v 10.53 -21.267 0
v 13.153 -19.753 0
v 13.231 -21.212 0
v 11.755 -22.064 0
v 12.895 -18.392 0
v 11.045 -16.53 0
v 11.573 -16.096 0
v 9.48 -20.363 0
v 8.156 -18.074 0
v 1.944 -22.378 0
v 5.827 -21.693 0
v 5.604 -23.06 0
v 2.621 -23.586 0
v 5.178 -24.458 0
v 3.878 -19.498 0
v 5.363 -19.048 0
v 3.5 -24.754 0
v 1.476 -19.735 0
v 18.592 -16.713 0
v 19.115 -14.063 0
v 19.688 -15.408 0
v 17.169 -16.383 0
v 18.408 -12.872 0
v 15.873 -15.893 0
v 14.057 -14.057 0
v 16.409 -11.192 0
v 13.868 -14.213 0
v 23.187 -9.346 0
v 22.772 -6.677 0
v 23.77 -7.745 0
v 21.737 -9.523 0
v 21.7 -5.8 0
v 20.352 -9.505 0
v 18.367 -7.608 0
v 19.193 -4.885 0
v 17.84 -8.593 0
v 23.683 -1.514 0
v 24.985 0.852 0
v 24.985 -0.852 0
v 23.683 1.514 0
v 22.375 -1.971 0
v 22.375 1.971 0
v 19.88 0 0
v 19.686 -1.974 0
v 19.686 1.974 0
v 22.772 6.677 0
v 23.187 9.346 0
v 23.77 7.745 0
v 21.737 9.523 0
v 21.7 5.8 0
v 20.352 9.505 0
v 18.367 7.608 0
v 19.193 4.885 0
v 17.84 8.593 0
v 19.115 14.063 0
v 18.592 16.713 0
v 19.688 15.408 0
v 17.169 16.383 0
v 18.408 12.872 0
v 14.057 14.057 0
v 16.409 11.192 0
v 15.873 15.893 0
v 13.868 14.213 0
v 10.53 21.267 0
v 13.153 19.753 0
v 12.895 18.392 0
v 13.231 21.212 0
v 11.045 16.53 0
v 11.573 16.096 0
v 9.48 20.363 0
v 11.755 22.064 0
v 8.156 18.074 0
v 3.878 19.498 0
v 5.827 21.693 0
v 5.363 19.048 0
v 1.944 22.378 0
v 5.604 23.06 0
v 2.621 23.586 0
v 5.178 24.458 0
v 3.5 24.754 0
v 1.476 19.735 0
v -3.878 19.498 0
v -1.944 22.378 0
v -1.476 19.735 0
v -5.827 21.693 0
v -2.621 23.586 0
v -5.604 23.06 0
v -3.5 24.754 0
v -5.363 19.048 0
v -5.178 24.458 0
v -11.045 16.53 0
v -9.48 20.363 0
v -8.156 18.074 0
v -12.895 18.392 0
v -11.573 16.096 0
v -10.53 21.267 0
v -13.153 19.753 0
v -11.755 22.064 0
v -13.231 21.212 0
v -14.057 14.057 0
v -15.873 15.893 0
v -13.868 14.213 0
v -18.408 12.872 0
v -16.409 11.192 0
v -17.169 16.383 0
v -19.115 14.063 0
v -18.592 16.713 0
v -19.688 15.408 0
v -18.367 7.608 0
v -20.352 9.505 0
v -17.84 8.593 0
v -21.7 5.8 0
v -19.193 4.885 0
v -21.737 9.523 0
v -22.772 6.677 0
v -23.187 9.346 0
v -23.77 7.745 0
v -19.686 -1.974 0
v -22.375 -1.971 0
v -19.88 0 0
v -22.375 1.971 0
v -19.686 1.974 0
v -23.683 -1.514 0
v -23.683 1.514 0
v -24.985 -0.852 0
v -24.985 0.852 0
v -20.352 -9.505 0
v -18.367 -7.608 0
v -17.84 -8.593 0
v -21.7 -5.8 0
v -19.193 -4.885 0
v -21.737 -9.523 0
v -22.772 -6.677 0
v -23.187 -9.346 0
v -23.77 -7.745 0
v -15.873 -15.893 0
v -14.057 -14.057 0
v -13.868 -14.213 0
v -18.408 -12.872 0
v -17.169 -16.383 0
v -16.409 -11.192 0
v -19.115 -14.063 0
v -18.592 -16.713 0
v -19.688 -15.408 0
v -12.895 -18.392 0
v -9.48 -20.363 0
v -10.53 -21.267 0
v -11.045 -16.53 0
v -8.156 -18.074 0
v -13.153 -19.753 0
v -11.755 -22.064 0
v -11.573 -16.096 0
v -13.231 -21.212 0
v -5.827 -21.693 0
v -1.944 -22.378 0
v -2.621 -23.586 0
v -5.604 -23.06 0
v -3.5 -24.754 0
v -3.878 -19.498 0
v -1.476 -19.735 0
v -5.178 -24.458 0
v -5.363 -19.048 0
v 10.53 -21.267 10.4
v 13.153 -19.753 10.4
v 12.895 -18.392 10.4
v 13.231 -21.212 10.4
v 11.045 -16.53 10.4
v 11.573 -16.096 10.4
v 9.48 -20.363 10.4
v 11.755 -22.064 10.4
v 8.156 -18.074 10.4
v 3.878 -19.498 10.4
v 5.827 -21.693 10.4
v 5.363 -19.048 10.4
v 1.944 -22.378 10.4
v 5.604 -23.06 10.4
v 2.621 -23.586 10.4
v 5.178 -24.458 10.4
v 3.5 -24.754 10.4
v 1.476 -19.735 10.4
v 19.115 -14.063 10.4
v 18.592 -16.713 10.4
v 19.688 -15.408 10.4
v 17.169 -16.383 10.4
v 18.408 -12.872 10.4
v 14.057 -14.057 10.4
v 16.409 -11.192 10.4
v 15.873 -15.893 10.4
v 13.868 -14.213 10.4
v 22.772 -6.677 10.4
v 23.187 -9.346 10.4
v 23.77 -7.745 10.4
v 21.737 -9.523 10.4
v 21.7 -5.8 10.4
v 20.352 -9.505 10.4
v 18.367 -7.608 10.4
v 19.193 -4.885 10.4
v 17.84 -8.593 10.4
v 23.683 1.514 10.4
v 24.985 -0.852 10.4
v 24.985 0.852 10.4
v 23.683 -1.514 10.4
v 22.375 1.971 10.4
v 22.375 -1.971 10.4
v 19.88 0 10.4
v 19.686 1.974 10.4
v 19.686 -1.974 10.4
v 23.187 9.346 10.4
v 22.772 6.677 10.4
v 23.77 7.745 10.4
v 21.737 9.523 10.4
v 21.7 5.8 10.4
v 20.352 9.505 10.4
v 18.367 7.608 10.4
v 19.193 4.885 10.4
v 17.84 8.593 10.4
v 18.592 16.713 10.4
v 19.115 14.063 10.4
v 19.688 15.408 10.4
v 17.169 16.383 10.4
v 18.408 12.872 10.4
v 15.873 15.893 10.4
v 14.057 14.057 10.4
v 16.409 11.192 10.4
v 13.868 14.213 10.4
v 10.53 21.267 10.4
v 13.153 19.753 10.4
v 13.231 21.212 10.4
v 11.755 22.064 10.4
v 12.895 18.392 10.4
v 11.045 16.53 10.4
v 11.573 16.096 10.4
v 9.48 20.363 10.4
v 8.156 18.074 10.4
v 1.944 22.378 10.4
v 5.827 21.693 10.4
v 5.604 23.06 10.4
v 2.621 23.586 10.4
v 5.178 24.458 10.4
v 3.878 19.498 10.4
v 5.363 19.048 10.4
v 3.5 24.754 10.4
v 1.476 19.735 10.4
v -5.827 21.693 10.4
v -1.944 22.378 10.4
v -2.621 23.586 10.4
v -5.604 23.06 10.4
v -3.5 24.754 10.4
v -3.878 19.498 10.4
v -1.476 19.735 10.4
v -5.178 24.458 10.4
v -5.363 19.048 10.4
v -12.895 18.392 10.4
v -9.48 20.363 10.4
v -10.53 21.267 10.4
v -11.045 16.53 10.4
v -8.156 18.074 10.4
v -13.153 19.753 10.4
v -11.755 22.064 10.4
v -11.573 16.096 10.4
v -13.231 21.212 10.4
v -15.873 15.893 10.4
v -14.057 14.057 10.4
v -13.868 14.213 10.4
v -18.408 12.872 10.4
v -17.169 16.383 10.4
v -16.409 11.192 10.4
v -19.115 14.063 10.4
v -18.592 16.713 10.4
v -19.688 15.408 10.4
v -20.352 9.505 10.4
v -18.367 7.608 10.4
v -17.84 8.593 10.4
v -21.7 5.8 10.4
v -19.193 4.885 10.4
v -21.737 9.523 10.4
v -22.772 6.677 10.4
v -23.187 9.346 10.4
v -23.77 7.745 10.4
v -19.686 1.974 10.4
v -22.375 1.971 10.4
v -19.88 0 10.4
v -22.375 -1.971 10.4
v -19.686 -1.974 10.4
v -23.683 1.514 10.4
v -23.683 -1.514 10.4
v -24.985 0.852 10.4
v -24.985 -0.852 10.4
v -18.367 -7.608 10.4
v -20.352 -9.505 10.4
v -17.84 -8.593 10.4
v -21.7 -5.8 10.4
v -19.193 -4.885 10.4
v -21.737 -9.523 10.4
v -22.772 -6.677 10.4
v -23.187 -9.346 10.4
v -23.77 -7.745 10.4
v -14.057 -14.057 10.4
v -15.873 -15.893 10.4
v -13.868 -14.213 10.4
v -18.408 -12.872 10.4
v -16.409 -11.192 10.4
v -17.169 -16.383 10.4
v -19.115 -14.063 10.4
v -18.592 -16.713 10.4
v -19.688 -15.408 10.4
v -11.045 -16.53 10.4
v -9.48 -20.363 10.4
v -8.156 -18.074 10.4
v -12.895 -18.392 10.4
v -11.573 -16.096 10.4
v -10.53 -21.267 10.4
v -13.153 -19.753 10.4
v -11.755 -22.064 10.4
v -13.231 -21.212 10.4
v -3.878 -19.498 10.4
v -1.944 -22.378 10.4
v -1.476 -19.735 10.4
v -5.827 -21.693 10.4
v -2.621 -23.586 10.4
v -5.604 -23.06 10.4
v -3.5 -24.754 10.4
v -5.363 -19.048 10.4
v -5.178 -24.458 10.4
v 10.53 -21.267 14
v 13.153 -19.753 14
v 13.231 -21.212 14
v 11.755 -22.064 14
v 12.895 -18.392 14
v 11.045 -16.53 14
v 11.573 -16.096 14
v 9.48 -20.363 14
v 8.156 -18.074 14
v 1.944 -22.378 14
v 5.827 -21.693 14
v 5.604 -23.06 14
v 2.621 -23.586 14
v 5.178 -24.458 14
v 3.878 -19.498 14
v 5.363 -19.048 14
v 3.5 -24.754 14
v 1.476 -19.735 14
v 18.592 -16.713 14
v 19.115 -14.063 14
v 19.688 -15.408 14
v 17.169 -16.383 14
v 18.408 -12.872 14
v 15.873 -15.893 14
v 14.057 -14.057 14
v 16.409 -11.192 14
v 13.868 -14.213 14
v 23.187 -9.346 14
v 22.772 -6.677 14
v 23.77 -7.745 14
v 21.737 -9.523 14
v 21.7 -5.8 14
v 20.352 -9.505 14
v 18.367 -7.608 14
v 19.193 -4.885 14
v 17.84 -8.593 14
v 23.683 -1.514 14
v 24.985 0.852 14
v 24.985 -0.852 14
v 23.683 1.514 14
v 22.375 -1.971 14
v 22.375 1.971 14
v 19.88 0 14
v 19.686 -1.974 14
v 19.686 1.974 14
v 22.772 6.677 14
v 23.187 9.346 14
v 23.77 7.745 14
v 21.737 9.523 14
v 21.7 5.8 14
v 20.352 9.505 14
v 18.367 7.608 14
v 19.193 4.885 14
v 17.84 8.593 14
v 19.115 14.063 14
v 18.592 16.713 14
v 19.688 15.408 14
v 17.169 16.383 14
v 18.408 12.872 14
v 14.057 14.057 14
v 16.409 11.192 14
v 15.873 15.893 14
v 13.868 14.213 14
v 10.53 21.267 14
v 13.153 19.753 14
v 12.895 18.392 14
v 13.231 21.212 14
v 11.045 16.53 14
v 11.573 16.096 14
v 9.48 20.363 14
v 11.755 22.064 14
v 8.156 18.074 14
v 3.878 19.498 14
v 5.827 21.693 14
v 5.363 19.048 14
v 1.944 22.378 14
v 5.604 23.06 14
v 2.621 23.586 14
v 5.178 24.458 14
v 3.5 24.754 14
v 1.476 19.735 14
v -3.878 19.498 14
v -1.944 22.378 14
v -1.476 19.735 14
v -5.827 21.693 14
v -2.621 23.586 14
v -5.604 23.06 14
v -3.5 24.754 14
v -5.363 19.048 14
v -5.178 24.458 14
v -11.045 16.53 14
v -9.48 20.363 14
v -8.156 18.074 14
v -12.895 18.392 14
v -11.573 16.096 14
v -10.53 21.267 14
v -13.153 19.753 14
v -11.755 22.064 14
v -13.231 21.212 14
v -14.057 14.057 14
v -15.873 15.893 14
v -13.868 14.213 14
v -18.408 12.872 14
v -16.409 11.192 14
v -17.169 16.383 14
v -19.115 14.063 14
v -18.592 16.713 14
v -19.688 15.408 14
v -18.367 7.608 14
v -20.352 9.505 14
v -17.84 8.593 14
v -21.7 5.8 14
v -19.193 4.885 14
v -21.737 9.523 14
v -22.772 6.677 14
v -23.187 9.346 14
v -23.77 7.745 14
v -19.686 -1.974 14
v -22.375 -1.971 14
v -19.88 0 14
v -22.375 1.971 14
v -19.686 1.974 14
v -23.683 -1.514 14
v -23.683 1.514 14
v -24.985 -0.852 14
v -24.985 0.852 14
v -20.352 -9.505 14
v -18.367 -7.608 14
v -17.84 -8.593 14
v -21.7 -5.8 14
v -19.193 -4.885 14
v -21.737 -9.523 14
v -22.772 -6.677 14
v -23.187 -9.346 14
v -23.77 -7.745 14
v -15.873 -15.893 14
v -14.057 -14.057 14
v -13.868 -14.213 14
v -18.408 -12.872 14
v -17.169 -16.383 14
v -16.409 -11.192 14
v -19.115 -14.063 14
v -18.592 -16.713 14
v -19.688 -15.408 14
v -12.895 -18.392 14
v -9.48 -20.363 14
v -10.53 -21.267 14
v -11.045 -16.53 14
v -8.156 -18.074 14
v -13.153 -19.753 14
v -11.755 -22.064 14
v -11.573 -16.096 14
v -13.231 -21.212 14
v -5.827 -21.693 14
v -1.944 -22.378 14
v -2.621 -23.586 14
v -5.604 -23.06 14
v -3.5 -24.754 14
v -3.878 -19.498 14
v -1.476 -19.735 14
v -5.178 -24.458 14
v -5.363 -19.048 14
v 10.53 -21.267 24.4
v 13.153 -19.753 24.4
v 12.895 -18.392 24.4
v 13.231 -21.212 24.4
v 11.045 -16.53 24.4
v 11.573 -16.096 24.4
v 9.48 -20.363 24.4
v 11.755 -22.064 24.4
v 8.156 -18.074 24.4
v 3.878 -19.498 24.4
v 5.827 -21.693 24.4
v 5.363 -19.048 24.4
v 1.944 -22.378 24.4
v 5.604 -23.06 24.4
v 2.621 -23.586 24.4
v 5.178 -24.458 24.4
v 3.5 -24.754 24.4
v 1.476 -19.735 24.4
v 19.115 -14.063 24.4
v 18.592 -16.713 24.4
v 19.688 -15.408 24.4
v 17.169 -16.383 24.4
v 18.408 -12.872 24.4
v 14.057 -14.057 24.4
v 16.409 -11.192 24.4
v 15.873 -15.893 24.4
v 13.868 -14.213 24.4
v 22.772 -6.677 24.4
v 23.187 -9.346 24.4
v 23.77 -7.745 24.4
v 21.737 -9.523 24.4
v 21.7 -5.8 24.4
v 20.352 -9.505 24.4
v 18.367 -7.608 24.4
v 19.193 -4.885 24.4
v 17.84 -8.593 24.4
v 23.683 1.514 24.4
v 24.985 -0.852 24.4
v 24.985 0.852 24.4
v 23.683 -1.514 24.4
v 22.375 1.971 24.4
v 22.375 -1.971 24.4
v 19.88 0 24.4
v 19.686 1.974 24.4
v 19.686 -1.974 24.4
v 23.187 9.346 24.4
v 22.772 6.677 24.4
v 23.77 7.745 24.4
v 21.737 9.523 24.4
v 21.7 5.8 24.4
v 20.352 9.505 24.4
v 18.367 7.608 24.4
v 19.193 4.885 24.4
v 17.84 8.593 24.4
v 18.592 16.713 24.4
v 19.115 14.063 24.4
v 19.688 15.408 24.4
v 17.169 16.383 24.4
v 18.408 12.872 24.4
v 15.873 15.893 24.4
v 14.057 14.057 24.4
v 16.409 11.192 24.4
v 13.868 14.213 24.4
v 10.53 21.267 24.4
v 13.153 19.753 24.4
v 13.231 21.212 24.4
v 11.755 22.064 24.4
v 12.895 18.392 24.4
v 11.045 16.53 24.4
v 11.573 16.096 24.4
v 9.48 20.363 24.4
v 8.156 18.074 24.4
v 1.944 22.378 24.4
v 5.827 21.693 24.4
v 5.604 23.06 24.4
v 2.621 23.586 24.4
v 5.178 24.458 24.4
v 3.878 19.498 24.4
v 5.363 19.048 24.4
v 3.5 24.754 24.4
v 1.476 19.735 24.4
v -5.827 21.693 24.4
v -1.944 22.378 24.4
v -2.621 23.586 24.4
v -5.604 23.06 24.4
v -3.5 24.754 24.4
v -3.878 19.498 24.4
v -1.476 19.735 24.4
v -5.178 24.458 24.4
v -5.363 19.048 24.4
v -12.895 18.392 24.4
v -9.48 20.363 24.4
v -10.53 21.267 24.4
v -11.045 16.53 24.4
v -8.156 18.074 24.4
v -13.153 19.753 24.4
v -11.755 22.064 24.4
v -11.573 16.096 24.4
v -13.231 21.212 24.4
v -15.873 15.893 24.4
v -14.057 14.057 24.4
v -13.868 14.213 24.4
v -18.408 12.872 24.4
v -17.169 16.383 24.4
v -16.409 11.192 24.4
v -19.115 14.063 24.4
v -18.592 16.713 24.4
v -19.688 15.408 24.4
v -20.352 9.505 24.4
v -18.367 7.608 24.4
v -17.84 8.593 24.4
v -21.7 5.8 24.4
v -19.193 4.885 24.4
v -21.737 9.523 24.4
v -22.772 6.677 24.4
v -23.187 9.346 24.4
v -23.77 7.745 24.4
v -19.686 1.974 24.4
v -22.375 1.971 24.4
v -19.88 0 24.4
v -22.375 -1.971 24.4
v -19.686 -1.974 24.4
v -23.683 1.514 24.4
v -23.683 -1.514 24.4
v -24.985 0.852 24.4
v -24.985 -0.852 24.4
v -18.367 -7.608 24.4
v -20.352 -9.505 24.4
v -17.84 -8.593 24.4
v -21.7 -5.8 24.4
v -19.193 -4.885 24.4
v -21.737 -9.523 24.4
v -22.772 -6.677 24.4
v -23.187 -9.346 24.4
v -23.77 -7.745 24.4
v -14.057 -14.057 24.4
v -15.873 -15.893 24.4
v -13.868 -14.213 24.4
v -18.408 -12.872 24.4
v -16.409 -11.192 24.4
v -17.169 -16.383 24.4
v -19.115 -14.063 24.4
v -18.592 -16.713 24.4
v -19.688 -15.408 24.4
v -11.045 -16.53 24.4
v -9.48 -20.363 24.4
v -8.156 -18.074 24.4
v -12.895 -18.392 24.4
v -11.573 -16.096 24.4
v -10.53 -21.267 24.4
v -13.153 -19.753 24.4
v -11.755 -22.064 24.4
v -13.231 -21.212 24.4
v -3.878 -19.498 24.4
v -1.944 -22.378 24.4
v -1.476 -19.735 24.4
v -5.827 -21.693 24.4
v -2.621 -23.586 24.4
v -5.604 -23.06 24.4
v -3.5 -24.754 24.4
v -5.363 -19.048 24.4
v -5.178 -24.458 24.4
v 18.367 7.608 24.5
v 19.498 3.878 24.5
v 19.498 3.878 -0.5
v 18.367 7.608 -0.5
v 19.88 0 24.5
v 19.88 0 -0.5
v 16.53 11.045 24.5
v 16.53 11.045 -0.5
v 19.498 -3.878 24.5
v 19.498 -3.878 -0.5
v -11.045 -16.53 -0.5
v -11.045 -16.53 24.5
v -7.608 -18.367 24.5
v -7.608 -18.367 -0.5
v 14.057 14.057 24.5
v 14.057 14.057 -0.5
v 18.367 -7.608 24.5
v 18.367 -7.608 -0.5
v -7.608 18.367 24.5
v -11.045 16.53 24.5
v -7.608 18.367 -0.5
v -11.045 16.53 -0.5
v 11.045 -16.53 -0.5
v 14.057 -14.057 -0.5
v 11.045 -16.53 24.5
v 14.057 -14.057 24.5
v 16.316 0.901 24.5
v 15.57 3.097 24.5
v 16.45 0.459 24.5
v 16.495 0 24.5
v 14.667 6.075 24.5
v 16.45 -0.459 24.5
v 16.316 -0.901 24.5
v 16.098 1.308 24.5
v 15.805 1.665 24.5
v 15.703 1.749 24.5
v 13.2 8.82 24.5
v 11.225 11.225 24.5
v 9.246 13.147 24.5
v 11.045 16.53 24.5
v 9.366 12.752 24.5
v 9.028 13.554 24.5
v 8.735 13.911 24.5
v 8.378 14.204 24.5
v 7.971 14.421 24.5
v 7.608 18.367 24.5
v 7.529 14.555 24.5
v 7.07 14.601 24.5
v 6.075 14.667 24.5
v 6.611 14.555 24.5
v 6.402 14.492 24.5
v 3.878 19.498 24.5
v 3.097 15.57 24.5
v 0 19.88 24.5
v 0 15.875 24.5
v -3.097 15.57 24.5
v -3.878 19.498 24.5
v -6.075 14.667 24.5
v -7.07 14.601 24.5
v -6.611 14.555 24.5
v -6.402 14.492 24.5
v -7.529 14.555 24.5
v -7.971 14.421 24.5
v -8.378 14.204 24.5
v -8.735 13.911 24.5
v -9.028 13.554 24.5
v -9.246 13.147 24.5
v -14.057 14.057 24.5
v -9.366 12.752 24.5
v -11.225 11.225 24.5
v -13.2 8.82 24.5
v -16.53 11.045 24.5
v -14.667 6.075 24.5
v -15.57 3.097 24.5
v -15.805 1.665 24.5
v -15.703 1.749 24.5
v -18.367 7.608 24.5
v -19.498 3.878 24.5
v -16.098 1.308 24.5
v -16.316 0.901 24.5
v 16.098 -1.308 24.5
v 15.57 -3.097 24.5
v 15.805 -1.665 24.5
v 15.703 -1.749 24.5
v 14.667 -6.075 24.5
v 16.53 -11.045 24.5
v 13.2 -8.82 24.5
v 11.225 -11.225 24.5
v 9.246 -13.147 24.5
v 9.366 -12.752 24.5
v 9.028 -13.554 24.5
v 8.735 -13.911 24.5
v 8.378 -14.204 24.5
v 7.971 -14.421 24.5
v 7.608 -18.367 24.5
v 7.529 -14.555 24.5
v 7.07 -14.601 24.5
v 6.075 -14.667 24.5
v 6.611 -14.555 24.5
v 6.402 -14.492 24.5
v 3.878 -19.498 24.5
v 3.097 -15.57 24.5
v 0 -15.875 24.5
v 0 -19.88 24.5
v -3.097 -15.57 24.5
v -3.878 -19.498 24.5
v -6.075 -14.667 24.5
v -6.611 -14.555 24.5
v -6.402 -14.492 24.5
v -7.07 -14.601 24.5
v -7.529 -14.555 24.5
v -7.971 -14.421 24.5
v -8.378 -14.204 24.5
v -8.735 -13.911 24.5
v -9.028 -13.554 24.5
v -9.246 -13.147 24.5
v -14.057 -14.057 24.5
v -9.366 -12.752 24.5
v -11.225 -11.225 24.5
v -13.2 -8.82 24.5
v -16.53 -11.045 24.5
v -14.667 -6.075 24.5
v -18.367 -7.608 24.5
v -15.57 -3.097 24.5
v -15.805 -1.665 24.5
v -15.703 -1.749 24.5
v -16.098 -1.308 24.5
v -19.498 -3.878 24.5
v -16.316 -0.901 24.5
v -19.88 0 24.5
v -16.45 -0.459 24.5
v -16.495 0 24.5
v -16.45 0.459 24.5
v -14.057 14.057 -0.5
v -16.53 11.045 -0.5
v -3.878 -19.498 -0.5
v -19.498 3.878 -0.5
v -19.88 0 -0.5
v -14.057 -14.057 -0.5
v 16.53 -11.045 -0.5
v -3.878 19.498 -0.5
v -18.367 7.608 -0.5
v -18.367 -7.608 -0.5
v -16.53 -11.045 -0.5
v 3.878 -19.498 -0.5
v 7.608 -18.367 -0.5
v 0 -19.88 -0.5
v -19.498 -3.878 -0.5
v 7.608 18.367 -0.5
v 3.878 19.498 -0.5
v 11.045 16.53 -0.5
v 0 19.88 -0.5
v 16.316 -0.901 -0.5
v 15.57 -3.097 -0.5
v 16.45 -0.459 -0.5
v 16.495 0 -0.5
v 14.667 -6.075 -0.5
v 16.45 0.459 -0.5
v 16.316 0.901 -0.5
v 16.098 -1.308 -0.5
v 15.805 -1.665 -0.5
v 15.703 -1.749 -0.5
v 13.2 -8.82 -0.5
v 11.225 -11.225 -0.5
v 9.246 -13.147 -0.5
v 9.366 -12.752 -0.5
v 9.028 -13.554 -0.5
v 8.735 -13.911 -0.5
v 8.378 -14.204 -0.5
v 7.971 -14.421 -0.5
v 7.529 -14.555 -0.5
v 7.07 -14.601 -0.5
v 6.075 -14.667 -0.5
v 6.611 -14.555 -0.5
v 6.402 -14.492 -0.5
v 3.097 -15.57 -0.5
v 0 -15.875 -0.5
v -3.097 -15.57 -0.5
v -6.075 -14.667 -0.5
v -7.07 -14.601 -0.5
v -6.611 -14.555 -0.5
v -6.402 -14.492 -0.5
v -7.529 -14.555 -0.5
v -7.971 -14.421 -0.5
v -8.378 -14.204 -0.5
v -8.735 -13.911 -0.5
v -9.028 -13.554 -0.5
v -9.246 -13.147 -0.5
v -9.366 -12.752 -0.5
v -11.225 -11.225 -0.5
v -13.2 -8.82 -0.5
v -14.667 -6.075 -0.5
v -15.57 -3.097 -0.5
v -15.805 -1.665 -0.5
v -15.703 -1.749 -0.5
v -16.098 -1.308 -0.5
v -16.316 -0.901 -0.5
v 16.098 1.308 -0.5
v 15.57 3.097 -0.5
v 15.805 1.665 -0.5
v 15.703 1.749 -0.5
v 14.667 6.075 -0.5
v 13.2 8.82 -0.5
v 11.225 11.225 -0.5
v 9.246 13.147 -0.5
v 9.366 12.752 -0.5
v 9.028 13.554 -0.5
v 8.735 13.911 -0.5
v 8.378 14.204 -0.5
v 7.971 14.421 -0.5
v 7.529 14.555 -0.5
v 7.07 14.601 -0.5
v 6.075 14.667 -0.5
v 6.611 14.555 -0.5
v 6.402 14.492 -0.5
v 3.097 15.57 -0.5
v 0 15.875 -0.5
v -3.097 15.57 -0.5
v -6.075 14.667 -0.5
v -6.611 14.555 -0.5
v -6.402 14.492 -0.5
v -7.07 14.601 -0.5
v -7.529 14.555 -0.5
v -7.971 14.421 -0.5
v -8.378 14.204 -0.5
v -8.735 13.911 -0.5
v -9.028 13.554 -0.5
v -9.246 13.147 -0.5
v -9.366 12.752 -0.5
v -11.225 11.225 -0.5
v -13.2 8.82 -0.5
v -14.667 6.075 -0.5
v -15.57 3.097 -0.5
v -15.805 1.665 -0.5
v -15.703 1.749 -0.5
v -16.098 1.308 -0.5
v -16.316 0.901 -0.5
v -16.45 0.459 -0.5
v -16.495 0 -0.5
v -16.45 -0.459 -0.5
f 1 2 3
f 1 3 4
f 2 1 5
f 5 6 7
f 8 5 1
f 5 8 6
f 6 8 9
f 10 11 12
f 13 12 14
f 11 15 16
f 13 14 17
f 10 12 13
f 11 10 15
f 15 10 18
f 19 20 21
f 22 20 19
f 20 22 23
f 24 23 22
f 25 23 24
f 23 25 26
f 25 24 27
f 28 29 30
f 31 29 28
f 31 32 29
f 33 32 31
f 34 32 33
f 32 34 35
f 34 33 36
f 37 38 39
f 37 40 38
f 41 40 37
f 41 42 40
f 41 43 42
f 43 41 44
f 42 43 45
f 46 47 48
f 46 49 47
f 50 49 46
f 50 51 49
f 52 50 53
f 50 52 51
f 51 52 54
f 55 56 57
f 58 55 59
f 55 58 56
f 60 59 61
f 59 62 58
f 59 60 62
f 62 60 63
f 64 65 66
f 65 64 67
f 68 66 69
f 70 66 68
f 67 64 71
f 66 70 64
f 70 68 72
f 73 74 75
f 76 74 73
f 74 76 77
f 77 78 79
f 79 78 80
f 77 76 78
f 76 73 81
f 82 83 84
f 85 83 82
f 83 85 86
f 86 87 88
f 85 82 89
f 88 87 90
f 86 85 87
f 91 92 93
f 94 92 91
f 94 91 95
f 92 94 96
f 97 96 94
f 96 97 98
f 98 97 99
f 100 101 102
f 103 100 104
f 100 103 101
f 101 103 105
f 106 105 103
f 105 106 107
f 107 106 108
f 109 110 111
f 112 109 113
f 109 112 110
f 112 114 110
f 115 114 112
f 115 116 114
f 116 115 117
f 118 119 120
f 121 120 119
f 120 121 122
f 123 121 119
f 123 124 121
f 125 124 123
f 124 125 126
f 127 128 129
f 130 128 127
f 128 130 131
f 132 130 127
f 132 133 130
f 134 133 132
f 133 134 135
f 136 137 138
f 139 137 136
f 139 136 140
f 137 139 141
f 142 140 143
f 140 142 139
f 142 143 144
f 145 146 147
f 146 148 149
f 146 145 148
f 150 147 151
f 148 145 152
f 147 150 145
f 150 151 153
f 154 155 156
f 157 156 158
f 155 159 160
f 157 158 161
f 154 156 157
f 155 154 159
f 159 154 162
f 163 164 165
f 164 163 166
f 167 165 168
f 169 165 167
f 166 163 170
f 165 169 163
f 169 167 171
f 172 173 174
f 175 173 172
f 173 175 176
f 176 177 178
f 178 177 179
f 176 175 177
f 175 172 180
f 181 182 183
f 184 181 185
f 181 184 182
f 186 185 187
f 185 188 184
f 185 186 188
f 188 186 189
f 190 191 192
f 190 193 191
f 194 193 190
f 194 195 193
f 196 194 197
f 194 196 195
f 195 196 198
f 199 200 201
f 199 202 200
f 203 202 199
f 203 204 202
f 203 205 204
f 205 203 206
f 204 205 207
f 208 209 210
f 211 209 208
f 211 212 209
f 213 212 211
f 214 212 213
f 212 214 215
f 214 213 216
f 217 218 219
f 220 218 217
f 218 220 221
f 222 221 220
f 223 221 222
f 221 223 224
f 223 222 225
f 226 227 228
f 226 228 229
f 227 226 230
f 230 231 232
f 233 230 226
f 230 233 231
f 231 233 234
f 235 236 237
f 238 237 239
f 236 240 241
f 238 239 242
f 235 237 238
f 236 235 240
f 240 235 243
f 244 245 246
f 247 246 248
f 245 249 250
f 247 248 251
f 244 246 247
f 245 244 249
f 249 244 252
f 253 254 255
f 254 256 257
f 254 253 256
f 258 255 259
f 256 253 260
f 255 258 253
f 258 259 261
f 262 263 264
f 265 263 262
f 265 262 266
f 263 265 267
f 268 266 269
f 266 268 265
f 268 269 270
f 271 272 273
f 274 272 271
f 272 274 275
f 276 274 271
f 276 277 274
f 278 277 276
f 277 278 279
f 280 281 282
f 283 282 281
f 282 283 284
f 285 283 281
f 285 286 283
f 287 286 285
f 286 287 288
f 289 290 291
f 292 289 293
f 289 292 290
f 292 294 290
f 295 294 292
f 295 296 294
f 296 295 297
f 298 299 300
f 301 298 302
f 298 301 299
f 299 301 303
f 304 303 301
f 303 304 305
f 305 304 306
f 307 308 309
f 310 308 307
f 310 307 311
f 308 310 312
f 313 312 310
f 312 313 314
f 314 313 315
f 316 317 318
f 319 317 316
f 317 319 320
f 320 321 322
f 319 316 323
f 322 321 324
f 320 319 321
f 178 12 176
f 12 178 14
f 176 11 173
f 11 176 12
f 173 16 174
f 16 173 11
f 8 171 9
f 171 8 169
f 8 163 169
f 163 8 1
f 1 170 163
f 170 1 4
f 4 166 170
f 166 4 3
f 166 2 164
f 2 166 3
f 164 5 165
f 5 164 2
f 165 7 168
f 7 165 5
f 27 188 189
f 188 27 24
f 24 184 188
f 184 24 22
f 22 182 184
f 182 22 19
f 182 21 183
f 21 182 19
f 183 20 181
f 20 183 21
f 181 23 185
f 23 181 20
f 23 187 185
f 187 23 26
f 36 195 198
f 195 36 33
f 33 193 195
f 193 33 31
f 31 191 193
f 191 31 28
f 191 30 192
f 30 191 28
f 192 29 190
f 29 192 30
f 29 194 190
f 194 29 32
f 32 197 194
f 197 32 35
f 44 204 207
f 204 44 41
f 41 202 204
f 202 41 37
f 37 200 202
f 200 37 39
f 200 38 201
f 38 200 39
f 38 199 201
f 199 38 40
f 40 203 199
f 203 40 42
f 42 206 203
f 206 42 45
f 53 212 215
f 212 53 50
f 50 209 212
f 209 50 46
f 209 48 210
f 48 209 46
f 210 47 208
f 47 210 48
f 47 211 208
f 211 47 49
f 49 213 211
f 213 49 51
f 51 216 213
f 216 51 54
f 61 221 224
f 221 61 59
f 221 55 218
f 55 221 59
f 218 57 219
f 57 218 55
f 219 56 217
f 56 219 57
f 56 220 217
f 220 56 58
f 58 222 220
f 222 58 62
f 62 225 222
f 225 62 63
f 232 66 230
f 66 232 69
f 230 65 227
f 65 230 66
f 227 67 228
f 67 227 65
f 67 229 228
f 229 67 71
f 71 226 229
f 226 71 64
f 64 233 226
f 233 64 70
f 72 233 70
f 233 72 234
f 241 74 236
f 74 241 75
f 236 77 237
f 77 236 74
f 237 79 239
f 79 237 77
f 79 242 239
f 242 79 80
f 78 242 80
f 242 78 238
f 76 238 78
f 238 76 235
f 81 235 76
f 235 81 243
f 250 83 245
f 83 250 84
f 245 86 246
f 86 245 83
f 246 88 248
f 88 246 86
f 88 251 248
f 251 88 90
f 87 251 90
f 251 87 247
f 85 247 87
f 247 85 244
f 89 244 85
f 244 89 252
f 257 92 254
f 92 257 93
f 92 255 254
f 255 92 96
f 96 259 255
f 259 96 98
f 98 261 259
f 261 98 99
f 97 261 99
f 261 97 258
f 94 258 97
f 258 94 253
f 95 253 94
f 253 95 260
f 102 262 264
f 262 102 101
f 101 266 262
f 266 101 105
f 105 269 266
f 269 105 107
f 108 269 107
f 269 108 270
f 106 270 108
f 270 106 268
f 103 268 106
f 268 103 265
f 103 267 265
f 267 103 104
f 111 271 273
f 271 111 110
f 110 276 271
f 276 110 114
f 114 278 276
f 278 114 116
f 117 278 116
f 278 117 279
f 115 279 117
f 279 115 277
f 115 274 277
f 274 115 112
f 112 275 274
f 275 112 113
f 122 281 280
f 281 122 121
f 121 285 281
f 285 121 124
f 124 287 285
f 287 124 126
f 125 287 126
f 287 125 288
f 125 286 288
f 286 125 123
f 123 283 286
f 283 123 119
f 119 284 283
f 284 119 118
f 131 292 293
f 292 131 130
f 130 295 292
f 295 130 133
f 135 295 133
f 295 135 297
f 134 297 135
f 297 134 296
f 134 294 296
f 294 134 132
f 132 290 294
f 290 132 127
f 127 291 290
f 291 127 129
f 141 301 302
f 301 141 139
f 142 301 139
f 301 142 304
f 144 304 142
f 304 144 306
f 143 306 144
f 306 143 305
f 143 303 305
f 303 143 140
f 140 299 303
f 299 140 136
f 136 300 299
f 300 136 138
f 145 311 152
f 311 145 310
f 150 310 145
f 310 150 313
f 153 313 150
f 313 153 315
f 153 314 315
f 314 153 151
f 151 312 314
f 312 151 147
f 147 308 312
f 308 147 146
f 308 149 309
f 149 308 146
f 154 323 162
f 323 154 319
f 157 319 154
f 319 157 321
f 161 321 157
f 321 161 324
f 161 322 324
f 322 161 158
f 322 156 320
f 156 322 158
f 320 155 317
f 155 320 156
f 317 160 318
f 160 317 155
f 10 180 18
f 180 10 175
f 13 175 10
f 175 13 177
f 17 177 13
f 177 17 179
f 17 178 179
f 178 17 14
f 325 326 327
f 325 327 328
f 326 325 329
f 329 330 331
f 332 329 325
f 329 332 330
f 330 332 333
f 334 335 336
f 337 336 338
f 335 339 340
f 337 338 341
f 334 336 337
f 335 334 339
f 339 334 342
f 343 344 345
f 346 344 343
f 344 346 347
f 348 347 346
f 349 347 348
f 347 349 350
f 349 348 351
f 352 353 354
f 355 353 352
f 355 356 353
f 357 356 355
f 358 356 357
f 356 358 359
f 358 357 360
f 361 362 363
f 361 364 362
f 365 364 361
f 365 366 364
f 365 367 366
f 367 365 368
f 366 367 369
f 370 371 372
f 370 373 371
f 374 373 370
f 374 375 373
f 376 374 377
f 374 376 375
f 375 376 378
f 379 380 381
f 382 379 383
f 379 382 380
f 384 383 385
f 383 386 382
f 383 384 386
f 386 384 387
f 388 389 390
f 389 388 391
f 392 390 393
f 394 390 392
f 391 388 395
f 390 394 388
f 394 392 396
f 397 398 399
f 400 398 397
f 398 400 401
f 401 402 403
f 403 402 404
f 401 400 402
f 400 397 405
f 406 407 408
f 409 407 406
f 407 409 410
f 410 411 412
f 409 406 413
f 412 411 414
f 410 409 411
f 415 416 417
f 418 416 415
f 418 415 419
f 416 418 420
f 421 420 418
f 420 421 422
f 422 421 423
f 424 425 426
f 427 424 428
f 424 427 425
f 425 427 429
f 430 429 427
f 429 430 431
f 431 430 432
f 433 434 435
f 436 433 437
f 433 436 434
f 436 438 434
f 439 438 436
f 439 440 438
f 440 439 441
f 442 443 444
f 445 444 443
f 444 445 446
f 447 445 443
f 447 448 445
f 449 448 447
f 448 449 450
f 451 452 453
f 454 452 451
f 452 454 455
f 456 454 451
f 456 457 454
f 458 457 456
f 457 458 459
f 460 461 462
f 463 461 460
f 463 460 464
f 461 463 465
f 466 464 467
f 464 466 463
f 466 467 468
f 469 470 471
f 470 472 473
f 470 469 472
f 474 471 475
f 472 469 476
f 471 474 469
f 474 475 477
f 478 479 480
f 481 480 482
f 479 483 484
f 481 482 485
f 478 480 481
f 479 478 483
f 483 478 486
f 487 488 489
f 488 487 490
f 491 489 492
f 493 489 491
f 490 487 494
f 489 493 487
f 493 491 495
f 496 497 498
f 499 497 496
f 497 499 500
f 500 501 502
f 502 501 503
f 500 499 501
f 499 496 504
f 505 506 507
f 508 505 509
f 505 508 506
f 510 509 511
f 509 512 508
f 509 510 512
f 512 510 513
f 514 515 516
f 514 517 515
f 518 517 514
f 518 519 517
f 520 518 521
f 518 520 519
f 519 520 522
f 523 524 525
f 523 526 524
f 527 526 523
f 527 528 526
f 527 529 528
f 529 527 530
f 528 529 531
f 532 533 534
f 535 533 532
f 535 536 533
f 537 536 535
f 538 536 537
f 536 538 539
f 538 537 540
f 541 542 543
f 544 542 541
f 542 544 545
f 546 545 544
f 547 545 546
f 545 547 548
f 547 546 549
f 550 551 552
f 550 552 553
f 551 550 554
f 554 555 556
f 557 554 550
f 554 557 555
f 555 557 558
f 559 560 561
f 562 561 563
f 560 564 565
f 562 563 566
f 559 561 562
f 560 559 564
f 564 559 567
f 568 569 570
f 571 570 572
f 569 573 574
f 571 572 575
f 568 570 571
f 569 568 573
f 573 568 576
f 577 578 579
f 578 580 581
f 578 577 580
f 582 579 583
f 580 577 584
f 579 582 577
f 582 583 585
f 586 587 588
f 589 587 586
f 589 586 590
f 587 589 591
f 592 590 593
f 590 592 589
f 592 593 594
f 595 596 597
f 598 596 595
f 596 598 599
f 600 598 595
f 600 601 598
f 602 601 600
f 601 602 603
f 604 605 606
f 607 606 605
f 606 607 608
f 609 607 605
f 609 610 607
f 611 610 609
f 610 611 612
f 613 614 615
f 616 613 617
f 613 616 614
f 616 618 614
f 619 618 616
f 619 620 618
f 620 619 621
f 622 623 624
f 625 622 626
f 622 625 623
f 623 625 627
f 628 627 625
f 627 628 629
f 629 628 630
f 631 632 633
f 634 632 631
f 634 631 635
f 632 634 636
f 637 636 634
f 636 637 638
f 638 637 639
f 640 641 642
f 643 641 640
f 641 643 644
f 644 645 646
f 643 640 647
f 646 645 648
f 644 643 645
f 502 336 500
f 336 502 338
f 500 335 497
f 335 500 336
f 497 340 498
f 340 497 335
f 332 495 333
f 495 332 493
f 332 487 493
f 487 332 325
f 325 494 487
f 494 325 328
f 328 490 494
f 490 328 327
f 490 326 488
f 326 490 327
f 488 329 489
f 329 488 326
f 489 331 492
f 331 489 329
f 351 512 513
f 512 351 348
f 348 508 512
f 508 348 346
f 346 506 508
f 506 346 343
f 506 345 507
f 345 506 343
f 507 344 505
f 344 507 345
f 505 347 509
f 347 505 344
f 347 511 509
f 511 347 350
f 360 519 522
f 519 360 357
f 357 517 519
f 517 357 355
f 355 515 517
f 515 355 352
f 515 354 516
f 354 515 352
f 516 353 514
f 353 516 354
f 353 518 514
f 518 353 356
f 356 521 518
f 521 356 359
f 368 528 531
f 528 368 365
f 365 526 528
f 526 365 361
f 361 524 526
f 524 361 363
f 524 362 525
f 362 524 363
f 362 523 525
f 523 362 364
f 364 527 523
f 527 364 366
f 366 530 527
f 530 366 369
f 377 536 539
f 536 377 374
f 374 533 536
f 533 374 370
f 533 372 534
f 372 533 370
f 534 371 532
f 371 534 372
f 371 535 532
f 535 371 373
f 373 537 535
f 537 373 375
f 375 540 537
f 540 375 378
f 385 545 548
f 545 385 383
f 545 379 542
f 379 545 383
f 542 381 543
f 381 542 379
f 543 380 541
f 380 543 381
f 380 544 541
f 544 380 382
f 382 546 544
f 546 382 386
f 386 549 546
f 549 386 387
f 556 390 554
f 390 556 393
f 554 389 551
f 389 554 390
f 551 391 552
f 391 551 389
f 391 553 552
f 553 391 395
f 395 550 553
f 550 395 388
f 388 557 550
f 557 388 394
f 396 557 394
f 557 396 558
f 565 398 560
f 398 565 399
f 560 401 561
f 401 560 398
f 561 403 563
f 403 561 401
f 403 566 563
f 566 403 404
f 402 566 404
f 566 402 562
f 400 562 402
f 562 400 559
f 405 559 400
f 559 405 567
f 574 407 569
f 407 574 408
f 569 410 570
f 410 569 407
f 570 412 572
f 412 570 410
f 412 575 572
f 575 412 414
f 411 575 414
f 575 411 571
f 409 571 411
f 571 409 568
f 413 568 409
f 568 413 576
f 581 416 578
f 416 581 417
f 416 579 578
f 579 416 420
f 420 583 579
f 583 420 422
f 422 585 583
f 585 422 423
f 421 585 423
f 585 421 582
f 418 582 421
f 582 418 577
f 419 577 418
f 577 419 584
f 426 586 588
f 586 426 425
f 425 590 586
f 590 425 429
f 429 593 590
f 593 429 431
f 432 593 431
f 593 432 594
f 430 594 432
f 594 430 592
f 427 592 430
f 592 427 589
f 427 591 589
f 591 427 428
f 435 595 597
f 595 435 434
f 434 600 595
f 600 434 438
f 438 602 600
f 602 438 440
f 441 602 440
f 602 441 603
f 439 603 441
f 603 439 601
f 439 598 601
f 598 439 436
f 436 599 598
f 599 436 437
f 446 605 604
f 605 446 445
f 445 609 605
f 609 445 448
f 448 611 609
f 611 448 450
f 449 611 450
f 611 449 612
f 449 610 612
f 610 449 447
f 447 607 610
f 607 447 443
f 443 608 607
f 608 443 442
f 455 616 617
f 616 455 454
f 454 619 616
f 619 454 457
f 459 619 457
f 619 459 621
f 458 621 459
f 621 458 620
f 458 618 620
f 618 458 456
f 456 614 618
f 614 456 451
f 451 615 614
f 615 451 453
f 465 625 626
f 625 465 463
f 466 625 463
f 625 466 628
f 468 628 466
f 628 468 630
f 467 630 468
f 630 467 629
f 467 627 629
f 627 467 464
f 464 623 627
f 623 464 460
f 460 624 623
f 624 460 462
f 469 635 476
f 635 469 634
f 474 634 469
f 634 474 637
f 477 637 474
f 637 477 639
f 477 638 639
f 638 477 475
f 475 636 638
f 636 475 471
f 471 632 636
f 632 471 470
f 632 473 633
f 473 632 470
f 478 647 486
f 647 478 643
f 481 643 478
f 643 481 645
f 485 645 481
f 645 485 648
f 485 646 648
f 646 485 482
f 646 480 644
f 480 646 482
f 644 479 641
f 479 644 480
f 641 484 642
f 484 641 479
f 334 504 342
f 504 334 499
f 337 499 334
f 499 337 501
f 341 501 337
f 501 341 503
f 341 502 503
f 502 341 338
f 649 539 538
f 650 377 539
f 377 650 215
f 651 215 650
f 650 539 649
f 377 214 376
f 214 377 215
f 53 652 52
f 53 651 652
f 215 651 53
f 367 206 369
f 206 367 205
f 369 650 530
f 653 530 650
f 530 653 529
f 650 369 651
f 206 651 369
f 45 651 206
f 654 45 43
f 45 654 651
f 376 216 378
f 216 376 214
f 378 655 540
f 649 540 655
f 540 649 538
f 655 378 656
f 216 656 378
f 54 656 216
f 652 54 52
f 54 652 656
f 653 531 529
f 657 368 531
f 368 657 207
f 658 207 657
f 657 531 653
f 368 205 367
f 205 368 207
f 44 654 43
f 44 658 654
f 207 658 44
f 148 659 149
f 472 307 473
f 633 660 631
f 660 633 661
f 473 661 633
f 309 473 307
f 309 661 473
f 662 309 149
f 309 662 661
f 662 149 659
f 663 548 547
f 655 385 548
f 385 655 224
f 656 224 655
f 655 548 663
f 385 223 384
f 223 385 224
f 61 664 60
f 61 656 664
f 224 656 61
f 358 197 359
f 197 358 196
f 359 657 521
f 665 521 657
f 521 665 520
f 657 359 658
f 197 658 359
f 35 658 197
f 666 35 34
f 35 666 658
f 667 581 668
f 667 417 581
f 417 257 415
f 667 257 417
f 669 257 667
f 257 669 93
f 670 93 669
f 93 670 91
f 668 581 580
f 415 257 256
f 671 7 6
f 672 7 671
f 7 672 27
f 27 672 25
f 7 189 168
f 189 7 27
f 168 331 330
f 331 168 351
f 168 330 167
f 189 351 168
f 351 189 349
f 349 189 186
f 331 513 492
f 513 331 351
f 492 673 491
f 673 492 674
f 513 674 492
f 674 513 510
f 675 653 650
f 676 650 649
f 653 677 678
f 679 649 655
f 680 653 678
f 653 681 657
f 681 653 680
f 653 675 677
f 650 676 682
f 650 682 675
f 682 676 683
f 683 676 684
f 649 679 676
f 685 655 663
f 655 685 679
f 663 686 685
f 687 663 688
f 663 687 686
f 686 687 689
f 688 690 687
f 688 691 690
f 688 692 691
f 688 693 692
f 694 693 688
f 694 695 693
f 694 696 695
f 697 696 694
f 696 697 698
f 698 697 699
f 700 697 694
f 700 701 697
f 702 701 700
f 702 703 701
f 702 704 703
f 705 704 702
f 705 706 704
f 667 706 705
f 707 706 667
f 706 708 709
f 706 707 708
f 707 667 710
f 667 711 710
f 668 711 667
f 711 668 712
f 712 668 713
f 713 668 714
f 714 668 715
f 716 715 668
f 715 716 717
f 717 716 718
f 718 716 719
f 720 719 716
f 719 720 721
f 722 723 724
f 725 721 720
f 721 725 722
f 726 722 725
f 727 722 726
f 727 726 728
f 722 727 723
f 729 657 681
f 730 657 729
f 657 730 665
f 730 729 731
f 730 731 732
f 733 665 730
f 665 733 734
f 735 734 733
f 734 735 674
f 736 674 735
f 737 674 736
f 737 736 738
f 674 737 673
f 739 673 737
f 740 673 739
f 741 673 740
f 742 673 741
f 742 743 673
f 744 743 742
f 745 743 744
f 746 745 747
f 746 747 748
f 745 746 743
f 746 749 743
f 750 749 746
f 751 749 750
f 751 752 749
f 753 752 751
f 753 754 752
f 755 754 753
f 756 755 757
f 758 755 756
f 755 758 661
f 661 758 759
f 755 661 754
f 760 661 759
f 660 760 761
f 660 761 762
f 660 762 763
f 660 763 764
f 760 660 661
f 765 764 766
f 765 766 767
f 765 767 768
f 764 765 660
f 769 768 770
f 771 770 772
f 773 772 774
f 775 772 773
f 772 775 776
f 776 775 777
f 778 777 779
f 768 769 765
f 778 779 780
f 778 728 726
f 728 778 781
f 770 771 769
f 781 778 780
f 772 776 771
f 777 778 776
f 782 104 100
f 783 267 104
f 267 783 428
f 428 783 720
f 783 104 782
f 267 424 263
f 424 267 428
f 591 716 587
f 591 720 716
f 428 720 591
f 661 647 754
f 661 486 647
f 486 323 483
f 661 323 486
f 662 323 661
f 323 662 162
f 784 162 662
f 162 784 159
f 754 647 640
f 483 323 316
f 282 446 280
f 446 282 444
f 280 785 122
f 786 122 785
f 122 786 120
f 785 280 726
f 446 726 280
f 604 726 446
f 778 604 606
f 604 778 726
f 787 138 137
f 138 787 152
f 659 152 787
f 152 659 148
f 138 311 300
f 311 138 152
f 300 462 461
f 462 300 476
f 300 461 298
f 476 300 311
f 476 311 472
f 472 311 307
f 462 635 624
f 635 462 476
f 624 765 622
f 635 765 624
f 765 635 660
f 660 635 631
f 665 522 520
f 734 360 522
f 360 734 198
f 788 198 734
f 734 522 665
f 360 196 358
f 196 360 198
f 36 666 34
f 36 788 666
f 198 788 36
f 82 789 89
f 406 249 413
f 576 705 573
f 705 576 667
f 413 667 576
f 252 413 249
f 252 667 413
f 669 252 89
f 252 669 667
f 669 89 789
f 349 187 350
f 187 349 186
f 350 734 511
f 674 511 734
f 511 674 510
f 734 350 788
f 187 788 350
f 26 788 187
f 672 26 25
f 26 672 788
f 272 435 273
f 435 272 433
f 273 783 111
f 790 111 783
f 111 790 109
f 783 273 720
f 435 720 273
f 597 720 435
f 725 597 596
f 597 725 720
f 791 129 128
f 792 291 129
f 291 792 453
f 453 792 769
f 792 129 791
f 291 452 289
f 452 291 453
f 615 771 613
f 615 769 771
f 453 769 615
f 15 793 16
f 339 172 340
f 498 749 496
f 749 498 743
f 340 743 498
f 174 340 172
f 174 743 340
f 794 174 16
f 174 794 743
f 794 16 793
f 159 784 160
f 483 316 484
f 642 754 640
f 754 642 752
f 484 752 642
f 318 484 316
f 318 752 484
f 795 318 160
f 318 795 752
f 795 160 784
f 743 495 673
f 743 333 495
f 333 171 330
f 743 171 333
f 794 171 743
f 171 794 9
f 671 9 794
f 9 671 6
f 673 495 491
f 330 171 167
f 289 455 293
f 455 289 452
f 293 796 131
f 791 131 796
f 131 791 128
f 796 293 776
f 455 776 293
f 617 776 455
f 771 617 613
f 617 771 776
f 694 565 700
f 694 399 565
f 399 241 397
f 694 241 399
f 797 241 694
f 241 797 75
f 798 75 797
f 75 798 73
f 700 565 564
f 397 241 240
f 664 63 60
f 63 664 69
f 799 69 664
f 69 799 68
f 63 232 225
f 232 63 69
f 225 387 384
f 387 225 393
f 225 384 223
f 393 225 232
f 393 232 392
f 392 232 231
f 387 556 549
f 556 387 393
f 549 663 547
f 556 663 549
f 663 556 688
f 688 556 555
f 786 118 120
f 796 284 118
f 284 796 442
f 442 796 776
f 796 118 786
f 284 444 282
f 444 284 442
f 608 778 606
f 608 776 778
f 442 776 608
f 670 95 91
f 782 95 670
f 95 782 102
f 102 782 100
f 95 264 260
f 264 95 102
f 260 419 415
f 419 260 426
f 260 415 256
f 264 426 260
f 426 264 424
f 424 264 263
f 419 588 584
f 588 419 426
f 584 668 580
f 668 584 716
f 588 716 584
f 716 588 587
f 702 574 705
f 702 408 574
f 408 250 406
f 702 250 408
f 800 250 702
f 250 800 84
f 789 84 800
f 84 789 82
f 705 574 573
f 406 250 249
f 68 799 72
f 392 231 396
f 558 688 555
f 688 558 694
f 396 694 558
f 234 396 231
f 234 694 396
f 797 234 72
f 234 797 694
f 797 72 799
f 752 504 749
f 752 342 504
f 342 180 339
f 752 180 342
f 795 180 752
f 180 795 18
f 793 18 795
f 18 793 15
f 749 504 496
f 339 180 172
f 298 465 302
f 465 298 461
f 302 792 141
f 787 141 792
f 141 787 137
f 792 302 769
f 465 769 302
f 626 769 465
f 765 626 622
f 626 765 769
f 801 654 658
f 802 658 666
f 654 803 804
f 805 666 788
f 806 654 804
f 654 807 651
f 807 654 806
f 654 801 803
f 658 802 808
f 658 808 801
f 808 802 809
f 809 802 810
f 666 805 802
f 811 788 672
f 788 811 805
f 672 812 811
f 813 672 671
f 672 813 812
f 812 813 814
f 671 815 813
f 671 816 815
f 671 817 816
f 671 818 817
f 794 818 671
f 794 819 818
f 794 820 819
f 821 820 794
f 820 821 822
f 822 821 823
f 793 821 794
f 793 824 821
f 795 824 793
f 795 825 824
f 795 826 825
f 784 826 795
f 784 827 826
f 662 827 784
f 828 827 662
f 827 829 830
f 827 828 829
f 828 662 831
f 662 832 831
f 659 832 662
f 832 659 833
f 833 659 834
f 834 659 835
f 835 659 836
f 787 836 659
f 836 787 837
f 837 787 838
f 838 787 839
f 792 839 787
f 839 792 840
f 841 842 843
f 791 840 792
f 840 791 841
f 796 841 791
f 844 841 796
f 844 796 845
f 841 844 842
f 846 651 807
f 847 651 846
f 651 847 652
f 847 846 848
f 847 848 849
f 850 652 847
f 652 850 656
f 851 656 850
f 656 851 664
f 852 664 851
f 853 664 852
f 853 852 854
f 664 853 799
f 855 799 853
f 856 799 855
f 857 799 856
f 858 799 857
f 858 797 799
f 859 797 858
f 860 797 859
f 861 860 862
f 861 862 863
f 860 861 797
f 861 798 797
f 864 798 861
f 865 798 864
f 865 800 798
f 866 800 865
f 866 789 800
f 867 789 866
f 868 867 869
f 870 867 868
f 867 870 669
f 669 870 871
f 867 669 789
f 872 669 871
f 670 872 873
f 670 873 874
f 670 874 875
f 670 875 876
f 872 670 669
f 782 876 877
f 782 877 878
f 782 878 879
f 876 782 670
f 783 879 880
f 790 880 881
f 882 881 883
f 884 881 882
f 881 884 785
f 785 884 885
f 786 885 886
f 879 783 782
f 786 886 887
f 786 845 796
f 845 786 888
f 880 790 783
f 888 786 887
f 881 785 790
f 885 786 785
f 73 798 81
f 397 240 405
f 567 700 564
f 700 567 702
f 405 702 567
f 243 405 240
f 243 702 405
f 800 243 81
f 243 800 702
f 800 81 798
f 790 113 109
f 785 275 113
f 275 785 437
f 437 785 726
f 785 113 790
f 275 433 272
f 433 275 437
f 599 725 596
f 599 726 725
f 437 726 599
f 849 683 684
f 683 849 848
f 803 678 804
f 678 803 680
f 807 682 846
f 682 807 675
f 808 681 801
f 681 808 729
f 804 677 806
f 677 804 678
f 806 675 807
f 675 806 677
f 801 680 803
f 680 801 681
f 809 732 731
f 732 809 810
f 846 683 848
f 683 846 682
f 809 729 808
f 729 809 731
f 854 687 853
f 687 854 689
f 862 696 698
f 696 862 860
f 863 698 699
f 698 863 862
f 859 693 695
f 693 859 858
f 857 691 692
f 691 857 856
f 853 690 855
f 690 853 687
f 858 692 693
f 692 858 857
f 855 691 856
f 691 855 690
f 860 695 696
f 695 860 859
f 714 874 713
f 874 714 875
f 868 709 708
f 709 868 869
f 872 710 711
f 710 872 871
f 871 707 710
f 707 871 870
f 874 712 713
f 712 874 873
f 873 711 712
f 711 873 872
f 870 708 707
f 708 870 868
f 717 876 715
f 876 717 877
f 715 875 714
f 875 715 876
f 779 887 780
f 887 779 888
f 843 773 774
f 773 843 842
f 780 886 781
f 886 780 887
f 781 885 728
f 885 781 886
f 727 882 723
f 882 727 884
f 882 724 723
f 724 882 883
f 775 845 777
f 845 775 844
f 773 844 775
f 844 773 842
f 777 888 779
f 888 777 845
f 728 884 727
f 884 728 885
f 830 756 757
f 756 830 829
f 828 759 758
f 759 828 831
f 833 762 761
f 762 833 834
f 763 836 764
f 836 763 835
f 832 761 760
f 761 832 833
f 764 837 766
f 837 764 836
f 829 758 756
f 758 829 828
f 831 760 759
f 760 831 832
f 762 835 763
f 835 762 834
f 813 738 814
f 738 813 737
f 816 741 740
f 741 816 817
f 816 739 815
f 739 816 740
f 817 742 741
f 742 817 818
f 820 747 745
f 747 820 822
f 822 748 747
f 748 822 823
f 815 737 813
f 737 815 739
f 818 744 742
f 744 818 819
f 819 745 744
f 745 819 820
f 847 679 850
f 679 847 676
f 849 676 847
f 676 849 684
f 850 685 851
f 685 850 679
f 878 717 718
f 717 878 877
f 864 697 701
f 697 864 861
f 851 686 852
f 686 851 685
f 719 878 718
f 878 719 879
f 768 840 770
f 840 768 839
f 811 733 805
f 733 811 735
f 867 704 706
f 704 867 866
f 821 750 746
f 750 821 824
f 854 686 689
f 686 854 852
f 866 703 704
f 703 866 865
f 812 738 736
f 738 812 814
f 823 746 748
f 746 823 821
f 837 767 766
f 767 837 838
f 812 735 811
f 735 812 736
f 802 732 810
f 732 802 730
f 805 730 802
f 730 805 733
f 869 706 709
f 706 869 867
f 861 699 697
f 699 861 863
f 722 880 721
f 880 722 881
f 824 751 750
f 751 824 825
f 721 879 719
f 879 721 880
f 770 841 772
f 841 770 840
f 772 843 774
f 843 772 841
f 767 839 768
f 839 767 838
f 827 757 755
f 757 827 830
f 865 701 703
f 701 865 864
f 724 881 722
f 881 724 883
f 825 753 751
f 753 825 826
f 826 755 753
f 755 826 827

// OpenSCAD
$fn = 32;

// ----------------------------------------------------------------------
// Two-module gear rim: z18 m2.5 and z18 m2.5, 24 mm wide
// ----------------------------------------------------------------------

// --- parameters (mm) ---
module_a = 2.5;           // first tooth module
teeth_a = 18;             // first band tooth count
module_b = 2.5;           // second tooth module
teeth_b = 18;             // second band tooth count
band_h = 10;              // height of one tooth band
web_t = 4;                // web thickness between the bands
total = 24;               // overall width over both bands
root_r = 19.38;           // root radius of the coarse band
hub_r = 19.88;            // hub radius
bore_d = 31.75;           // hub bore
hole_count = 6;           // lightening holes
hole_r = 14.14;           // lightening hole circle radius
hole_d = 4.71;            // lightening hole diameter

band_a = [[19.274, -1.974], [22.375, -1.971], [23.683, -1.514], [24.985, -0.852], [24.985, 0.852], [23.683, 1.514], [22.375, 1.971], [19.274, 1.974], [18.787, 4.737], [21.7, 5.8], [22.772, 6.677], [23.77, 7.745], [23.187, 9.346], [21.737, 9.523], [20.352, 9.505], [17.437, 8.447], [16.034, 10.877], [18.408, 12.872], [19.115, 14.063], [19.688, 15.408], [18.592, 16.713], [17.169, 16.383], [15.873, 15.893], [13.496, 13.901], [11.347, 15.705], [12.895, 18.392], [13.153, 19.753], [13.231, 21.212], [11.755, 22.064], [10.53, 21.267], [9.48, 20.363], [7.928, 17.679], [5.291, 18.639], [5.827, 21.693], [5.604, 23.06], [5.178, 24.458], [3.5, 24.754], [2.621, 23.586], [1.944, 22.378], [1.403, 19.324], [-1.403, 19.324], [-1.944, 22.378], [-2.621, 23.586], [-3.5, 24.754], [-5.178, 24.458], [-5.604, 23.06], [-5.827, 21.693], [-5.291, 18.639], [-7.928, 17.679], [-9.48, 20.363], [-10.53, 21.267], [-11.755, 22.064], [-13.231, 21.212], [-13.153, 19.753], [-12.895, 18.392], [-11.347, 15.705], [-13.496, 13.901], [-15.873, 15.893], [-17.169, 16.383], [-18.592, 16.713], [-19.688, 15.408], [-19.115, 14.063], [-18.408, 12.872], [-16.034, 10.877], [-17.437, 8.447], [-20.352, 9.505], [-21.737, 9.523], [-23.187, 9.346], [-23.77, 7.745], [-22.772, 6.677], [-21.7, 5.8], [-18.787, 4.737], [-19.274, 1.974], [-22.375, 1.971], [-23.683, 1.514], [-24.985, 0.852], [-24.985, -0.852], [-23.683, -1.514], [-22.375, -1.971], [-19.274, -1.974], [-18.787, -4.737], [-21.7, -5.8], [-22.772, -6.677], [-23.77, -7.745], [-23.187, -9.346], [-21.737, -9.523], [-20.352, -9.505], [-17.437, -8.447], [-16.034, -10.877], [-18.408, -12.872], [-19.115, -14.063], [-19.688, -15.408], [-18.592, -16.713], [-17.169, -16.383], [-15.873, -15.893], [-13.496, -13.901], [-11.347, -15.705], [-12.895, -18.392], [-13.153, -19.753], [-13.231, -21.212], [-11.755, -22.064], [-10.53, -21.267], [-9.48, -20.363], [-7.928, -17.679], [-5.291, -18.639], [-5.827, -21.693], [-5.604, -23.06], [-5.178, -24.458], [-3.5, -24.754], [-2.621, -23.586], [-1.944, -22.378], [-1.403, -19.324], [1.403, -19.324], [1.944, -22.378], [2.621, -23.586], [3.5, -24.754], [5.178, -24.458], [5.604, -23.06], [5.827, -21.693], [5.291, -18.639], [7.928, -17.679], [9.48, -20.363], [10.53, -21.267], [11.755, -22.064], [13.231, -21.212], [13.153, -19.753], [12.895, -18.392], [11.347, -15.705], [13.496, -13.901], [15.873, -15.893], [17.169, -16.383], [18.592, -16.713], [19.688, -15.408], [19.115, -14.063], [18.408, -12.872], [16.034, -10.877], [17.437, -8.447], [20.352, -9.505], [21.737, -9.523], [23.187, -9.346], [23.77, -7.745], [22.772, -6.677], [21.7, -5.8], [18.787, -4.737]];
band_b = [[19.274, -1.974], [22.375, -1.971], [23.683, -1.514], [24.985, -0.852], [24.985, 0.852], [23.683, 1.514], [22.375, 1.971], [19.274, 1.974], [18.787, 4.737], [21.7, 5.8], [22.772, 6.677], [23.77, 7.745], [23.187, 9.346], [21.737, 9.523], [20.352, 9.505], [17.437, 8.447], [16.034, 10.877], [18.408, 12.872], [19.115, 14.063], [19.688, 15.408], [18.592, 16.713], [17.169, 16.383], [15.873, 15.893], [13.496, 13.901], [11.347, 15.705], [12.895, 18.392], [13.153, 19.753], [13.231, 21.212], [11.755, 22.064], [10.53, 21.267], [9.48, 20.363], [7.928, 17.679], [5.291, 18.639], [5.827, 21.693], [5.604, 23.06], [5.178, 24.458], [3.5, 24.754], [2.621, 23.586], [1.944, 22.378], [1.403, 19.324], [-1.403, 19.324], [-1.944, 22.378], [-2.621, 23.586], [-3.5, 24.754], [-5.178, 24.458], [-5.604, 23.06], [-5.827, 21.693], [-5.291, 18.639], [-7.928, 17.679], [-9.48, 20.363], [-10.53, 21.267], [-11.755, 22.064], [-13.231, 21.212], [-13.153, 19.753], [-12.895, 18.392], [-11.347, 15.705], [-13.496, 13.901], [-15.873, 15.893], [-17.169, 16.383], [-18.592, 16.713], [-19.688, 15.408], [-19.115, 14.063], [-18.408, 12.872], [-16.034, 10.877], [-17.437, 8.447], [-20.352, 9.505], [-21.737, 9.523], [-23.187, 9.346], [-23.77, 7.745], [-22.772, 6.677], [-21.7, 5.8], [-18.787, 4.737], [-19.274, 1.974], [-22.375, 1.971], [-23.683, 1.514], [-24.985, 0.852], [-24.985, -0.852], [-23.683, -1.514], [-22.375, -1.971], [-19.274, -1.974], [-18.787, -4.737], [-21.7, -5.8], [-22.772, -6.677], [-23.77, -7.745], [-23.187, -9.346], [-21.737, -9.523], [-20.352, -9.505], [-17.437, -8.447], [-16.034, -10.877], [-18.408, -12.872], [-19.115, -14.063], [-19.688, -15.408], [-18.592, -16.713], [-17.169, -16.383], [-15.873, -15.893], [-13.496, -13.901], [-11.347, -15.705], [-12.895, -18.392], [-13.153, -19.753], [-13.231, -21.212], [-11.755, -22.064], [-10.53, -21.267], [-9.48, -20.363], [-7.928, -17.679], [-5.291, -18.639], [-5.827, -21.693], [-5.604, -23.06], [-5.178, -24.458], [-3.5, -24.754], [-2.621, -23.586], [-1.944, -22.378], [-1.403, -19.324], [1.403, -19.324], [1.944, -22.378], [2.621, -23.586], [3.5, -24.754], [5.178, -24.458], [5.604, -23.06], [5.827, -21.693], [5.291, -18.639], [7.928, -17.679], [9.48, -20.363], [10.53, -21.267], [11.755, -22.064], [13.231, -21.212], [13.153, -19.753], [12.895, -18.392], [11.347, -15.705], [13.496, -13.901], [15.873, -15.893], [17.169, -16.383], [18.592, -16.713], [19.688, -15.408], [19.115, -14.063], [18.408, -12.872], [16.034, -10.877], [17.437, -8.447], [20.352, -9.505], [21.737, -9.523], [23.187, -9.346], [23.77, -7.745], [22.772, -6.677], [21.7, -5.8], [18.787, -4.737]];

difference() {
  union() {
    /* tooth band A, overlapping the web by 0.4 mm */
    linear_extrude(height = band_h + 0.4) polygon(band_a);
    /* web */
    translate([0, 0, band_h - 0.4]) cylinder(h = web_t + 0.8, d = 2 * root_r);
    /* tooth band B */
    translate([0, 0, band_h + web_t]) linear_extrude(height = band_h + 0.4) polygon(band_b);
    /* hub */
    translate([0, 0, -0.5]) cylinder(h = total + 1.0, d = 2 * hub_r);
  }
  /* bore */
  translate([0, 0, -2.5]) cylinder(h = total + 5, d = bore_d);
  /* lightening holes through the web */
  for (i = [0 : hole_count - 1]) {
    a = i * 360 / hole_count;
    translate([hole_r * cos(a), hole_r * sin(a), -2.5]) cylinder(h = total + 5, d = hole_d);
  }
}
